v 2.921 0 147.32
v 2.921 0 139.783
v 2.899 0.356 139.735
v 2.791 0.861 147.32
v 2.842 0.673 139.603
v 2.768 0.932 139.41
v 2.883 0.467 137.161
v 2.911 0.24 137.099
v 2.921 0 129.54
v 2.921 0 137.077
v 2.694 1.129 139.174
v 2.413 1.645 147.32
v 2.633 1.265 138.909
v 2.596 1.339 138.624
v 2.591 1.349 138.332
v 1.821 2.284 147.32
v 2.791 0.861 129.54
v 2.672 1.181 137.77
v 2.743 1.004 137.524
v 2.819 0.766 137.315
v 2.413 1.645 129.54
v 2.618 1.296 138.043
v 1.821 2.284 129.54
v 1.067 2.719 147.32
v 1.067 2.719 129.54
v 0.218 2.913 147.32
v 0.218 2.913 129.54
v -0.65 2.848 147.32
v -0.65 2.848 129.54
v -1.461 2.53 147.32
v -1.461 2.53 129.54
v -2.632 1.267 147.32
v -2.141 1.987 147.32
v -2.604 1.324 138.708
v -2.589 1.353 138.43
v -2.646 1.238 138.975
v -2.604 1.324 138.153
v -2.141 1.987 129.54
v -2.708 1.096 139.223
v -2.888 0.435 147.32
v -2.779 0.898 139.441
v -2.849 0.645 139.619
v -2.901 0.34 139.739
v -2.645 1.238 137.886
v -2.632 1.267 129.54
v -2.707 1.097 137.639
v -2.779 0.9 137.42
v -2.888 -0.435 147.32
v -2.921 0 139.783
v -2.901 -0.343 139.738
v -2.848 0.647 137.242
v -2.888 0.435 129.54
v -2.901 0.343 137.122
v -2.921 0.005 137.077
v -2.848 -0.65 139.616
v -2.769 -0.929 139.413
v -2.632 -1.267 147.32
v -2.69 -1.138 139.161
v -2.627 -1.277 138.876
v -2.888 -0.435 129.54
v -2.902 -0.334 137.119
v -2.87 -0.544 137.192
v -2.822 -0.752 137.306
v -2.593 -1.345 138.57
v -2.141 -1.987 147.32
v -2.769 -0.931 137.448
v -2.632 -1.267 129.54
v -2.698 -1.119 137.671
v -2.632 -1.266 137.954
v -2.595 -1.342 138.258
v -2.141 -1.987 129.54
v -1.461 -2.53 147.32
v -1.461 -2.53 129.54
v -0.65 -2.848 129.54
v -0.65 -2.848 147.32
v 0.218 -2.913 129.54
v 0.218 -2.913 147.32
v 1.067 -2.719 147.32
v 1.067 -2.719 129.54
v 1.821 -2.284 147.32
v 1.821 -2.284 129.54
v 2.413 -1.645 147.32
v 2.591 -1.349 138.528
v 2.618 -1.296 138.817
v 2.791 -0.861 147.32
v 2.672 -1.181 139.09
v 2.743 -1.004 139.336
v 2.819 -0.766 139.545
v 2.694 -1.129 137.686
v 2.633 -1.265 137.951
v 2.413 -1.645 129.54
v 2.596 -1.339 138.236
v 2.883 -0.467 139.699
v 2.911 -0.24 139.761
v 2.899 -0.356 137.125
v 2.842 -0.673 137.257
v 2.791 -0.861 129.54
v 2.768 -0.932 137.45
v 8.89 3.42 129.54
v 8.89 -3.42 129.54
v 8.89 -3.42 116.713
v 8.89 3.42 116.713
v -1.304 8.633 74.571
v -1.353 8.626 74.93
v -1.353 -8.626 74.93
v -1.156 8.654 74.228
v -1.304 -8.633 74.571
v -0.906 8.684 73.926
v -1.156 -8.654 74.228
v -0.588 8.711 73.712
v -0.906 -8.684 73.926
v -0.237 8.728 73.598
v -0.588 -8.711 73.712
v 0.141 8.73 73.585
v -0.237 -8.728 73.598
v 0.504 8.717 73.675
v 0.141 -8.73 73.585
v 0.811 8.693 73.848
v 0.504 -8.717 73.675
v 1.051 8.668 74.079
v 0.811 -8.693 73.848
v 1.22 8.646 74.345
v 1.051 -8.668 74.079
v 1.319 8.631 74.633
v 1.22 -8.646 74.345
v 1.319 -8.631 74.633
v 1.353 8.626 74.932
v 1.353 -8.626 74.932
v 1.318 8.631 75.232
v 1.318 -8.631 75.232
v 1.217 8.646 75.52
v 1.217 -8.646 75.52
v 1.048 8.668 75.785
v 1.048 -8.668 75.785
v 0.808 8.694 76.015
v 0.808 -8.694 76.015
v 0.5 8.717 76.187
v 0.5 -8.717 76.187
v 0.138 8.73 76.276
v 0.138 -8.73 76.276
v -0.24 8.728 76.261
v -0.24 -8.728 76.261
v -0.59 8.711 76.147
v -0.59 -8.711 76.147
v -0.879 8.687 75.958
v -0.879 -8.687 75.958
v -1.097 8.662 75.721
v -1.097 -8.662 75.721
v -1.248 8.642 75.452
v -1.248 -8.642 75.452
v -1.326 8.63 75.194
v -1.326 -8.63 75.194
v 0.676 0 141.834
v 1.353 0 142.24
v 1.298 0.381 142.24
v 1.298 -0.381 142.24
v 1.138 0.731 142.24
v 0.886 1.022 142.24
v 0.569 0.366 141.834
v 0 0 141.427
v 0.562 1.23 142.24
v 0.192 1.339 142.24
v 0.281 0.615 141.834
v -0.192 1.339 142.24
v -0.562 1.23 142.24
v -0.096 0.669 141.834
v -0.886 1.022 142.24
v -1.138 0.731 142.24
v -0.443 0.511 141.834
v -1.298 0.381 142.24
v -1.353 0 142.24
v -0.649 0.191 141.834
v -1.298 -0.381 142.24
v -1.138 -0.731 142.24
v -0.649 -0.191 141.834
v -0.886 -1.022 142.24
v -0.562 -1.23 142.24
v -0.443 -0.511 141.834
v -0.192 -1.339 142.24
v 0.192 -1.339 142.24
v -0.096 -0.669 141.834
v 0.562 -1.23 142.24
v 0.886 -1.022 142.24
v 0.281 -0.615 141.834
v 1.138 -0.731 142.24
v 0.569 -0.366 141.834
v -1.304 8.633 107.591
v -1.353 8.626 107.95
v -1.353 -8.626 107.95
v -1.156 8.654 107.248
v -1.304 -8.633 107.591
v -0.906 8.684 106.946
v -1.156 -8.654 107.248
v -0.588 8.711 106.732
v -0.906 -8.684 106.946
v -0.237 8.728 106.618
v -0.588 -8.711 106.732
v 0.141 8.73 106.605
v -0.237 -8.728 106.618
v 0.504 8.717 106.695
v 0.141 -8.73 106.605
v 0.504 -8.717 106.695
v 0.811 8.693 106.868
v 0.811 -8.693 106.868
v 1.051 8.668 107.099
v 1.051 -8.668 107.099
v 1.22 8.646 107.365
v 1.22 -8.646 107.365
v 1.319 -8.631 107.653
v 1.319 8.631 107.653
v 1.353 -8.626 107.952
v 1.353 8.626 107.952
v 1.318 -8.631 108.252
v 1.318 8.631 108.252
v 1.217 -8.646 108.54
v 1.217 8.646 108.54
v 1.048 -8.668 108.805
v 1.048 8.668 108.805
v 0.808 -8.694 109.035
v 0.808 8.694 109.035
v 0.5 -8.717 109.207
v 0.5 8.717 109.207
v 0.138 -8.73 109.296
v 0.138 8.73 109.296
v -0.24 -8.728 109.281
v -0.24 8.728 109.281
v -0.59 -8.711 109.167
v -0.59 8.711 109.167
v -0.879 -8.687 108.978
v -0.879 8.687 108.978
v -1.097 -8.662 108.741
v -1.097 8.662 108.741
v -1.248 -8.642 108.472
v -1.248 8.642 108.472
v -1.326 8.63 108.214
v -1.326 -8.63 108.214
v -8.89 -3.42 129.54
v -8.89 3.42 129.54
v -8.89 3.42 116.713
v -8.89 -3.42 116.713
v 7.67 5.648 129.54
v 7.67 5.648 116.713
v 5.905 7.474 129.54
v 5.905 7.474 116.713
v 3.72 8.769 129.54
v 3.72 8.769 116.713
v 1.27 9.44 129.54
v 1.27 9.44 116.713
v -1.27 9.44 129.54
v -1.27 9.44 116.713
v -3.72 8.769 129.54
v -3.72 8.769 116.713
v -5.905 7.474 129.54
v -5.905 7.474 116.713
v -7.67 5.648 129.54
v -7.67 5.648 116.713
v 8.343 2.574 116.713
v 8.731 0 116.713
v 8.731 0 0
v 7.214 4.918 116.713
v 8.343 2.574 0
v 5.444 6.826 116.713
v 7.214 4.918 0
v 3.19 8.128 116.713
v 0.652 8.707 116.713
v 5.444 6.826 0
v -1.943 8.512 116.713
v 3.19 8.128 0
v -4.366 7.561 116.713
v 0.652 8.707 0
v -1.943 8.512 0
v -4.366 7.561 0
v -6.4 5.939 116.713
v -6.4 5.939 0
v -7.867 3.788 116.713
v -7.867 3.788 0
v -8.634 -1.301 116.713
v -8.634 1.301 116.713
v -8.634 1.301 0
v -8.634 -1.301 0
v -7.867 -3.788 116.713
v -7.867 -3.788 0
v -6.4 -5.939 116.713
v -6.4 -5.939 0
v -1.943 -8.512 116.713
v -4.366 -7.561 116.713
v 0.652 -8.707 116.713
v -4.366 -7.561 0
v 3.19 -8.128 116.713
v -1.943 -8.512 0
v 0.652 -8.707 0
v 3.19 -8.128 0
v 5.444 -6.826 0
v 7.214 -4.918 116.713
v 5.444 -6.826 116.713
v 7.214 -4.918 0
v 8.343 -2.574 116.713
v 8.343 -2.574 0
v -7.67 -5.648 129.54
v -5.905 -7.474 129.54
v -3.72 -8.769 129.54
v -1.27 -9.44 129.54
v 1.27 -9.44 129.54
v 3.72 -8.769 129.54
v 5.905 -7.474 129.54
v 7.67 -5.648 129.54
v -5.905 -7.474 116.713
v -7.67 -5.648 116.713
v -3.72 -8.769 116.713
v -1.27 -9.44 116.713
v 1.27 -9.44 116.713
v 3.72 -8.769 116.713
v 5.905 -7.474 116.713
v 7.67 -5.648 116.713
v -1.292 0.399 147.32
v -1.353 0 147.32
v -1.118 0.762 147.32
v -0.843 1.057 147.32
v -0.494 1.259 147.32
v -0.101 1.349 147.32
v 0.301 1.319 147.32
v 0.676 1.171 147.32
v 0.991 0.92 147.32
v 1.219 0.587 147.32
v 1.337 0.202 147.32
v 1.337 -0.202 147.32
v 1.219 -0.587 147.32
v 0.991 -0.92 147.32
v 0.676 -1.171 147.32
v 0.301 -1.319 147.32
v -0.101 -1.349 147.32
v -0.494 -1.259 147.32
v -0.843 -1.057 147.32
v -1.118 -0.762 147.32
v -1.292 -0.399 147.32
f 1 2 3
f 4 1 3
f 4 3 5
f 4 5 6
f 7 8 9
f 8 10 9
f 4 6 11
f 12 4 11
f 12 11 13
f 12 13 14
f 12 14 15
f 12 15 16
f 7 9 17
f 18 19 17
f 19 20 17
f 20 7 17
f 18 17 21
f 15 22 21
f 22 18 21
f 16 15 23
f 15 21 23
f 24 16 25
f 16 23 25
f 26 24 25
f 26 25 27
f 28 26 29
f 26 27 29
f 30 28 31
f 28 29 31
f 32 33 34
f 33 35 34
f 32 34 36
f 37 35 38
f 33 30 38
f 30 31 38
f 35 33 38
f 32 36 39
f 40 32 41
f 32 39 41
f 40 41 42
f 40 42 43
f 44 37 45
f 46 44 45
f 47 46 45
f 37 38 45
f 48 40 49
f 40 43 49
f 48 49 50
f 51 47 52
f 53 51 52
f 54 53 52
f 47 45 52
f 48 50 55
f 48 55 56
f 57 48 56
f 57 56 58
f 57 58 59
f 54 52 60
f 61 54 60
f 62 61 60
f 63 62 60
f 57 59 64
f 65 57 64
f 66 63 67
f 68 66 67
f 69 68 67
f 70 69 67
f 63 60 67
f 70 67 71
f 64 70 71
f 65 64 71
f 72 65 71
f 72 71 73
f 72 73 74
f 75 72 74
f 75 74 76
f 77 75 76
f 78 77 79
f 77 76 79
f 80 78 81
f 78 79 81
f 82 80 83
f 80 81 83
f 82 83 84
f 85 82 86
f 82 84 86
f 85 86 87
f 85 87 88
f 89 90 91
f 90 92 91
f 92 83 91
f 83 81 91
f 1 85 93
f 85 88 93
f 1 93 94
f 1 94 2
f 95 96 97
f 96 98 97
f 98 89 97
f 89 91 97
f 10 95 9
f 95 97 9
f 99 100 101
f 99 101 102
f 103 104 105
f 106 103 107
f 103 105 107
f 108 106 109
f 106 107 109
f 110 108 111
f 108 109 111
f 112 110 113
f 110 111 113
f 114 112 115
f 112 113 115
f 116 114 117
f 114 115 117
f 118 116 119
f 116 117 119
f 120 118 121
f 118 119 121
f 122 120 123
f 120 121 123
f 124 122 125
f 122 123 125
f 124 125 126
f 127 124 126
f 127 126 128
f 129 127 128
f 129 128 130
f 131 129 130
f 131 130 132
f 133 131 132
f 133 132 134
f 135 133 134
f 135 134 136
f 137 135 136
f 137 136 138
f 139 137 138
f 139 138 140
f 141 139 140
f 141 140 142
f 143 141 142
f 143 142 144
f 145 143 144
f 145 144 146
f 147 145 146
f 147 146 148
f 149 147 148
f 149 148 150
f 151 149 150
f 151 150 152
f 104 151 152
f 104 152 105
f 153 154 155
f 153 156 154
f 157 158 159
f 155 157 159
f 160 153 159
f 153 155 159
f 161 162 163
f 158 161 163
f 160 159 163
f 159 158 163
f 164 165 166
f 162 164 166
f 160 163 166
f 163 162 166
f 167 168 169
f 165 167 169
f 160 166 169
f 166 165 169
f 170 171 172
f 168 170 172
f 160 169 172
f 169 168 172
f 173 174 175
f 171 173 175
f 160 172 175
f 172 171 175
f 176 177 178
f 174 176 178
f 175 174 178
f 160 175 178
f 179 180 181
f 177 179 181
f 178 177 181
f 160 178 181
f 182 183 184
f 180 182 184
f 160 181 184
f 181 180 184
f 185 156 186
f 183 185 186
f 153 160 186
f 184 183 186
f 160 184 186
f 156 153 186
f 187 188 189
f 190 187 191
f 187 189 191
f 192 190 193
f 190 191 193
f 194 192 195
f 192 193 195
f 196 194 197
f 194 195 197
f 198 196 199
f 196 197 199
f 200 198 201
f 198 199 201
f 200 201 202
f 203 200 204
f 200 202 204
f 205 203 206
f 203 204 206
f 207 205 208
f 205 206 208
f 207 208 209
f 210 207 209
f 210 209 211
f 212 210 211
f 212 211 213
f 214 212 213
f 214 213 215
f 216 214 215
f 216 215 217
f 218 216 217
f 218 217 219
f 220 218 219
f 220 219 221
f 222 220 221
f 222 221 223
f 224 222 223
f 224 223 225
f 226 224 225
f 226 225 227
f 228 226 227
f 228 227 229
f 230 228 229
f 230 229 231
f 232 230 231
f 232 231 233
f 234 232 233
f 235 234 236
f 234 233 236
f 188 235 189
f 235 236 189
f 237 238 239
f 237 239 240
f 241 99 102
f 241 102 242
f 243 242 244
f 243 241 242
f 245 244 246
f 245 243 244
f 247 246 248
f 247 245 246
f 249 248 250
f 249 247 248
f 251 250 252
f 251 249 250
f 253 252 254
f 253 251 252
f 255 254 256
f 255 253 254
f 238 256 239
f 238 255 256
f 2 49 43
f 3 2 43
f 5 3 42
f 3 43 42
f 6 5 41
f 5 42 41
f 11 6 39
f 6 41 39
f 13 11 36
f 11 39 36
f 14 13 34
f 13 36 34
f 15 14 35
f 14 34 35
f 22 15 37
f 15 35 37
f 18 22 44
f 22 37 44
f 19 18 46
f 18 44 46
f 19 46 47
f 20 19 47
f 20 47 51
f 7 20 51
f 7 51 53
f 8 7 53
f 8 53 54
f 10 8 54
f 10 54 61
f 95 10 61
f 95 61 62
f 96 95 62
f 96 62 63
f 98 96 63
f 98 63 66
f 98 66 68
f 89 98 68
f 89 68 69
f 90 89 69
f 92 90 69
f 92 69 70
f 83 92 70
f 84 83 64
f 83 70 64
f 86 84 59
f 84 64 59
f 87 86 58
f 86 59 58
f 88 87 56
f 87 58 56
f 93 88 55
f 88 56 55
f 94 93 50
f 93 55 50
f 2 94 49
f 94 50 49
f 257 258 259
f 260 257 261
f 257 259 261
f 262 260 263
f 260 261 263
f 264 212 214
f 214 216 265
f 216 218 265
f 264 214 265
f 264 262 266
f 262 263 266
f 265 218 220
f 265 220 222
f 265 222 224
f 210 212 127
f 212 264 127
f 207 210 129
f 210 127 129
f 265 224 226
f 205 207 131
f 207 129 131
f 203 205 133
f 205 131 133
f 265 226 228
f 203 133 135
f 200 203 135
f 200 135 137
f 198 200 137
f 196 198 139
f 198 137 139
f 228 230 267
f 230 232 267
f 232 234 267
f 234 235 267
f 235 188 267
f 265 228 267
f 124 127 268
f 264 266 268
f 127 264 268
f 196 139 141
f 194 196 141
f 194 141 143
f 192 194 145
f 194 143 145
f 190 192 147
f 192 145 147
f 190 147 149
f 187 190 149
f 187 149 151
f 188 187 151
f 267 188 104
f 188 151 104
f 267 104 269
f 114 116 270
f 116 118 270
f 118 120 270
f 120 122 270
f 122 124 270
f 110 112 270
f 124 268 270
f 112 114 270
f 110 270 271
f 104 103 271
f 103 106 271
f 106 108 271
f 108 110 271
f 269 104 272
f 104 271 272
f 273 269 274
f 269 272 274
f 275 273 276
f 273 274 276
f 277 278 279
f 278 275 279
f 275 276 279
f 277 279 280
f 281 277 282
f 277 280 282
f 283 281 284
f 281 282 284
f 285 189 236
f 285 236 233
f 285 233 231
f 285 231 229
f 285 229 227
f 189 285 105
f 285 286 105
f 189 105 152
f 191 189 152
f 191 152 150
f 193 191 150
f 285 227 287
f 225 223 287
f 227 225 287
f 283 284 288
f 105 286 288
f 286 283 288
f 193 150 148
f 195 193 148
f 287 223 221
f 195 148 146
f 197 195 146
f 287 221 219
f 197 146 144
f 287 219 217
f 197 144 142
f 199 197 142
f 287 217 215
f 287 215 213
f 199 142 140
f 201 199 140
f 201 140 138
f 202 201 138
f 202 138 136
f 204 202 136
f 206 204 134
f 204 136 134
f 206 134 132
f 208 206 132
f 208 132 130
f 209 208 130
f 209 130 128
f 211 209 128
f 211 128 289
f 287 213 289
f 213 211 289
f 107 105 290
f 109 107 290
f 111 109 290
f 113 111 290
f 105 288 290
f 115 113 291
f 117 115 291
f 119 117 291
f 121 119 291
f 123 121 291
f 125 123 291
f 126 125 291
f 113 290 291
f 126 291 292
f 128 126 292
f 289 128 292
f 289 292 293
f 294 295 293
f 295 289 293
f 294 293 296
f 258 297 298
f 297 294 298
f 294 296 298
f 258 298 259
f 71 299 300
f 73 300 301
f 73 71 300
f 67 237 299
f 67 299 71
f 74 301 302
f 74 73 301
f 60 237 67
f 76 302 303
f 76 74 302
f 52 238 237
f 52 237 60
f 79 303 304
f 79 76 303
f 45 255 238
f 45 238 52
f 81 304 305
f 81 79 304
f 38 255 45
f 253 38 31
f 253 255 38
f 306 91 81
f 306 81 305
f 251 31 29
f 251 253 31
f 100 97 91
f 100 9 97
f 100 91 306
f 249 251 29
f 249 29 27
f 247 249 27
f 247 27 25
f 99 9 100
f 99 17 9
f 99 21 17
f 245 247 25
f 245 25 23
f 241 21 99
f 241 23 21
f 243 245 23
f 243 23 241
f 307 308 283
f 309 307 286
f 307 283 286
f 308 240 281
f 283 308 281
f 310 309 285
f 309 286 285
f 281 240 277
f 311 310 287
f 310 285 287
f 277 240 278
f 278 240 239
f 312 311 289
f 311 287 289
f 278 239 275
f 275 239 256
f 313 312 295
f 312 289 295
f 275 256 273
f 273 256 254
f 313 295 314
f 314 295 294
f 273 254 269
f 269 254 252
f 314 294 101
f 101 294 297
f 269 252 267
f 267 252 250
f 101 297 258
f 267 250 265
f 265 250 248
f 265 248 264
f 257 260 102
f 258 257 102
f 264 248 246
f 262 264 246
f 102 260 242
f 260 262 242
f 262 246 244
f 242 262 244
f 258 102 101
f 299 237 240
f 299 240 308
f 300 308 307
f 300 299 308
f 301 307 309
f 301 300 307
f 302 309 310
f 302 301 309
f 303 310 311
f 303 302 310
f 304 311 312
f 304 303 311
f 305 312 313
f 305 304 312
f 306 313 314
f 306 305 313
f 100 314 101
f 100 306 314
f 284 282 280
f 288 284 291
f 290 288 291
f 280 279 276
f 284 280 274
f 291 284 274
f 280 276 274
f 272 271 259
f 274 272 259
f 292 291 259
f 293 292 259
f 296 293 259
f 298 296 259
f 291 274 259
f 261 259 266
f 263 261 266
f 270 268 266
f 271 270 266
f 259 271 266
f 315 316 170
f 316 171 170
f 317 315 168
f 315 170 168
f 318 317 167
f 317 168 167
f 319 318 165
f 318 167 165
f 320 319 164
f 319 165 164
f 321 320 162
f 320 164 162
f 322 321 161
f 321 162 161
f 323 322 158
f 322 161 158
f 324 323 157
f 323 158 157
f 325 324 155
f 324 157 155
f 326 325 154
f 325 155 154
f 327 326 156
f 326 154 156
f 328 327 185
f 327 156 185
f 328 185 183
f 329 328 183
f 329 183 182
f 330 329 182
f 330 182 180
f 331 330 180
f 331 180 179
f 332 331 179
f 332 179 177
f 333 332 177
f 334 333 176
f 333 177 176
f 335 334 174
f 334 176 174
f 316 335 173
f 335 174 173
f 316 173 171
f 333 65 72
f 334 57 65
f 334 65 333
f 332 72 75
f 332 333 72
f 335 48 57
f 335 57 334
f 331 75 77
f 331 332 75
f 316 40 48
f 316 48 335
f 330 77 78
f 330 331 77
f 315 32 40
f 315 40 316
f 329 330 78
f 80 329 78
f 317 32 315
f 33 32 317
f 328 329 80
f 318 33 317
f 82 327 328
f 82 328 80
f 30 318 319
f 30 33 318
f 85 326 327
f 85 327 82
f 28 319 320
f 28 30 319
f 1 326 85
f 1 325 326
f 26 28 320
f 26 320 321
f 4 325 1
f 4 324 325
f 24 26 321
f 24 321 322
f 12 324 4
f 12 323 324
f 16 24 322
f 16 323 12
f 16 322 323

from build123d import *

# Parameters (mm, degrees)
SKETCH1_R                 = 8.73125
BOSS_EXTRUDE1_DEPTH       = 129.54
SKETCH2_R                 = 2.921
BOSS_EXTRUDE2_DEPTH       = 17.78
F_6_32_TAPPED_HOLE1_D     = 2.7051
F_6_32_TAPPED_HOLE2_D     = 2.7051
BOSS_EXTRUDE3_DEPTH       = 12.827
F_6_32_TAPPED_HOLE3_D     = 2.7051
F_6_32_TAPPED_HOLE3_DEPTH = 5.08
F_6_32_TAPPED_HOLE3_TIP   = 0.81269403


with BuildPart() as part:
    # Sketch1 → Boss-Extrude1 (new body)
    with BuildSketch(Plane.XY):
        Circle(SKETCH1_R)
    extrude(amount=BOSS_EXTRUDE1_DEPTH)

    # Sketch2 → Boss-Extrude2 (add)
    with BuildSketch(Plane.XY.offset(129.54)):
        Circle(SKETCH2_R)
    extrude(amount=BOSS_EXTRUDE2_DEPTH)

    # #6-32 Tapped Hole1 (through all)
    with Locations(Plane(origin=(0, 8.73125, 0), x_dir=(1, 0, 0), z_dir=(0, 1, 0))):
        with Locations((0, -74.93), (0, -107.95)):
            Hole(F_6_32_TAPPED_HOLE1_D / 2)

    # #6-32 Tapped Hole2 (through all)
    with Locations(Plane(origin=(2.921, 0, 0), x_dir=(0, 0, -1), z_dir=(1, 0, 0))):
        with Locations((-138.43, 0)):
            Hole(F_6_32_TAPPED_HOLE2_D / 2)

    # Sketch10 → Boss-Extrude3 (add)
    with BuildSketch(Plane.XY.offset(129.54)):
        with BuildLine():
            Line((8.89, -3.419579653), (8.89, 3.419579653))
            ThreePointArc((8.89, 3.419579653), (0, 9.525), (-8.89, 3.419579653))
            Line((-8.89, 3.419579653), (-8.89, -3.419579653))
            ThreePointArc((-8.89, -3.419579653), (0, -9.525), (8.89, -3.419579653))
        make_face()
    extrude(amount=-BOSS_EXTRUDE3_DEPTH)

    # #6-32 Tapped Hole3
    with Locations(Plane.XY.offset(147.32)):
        with Locations((0, 0)):
            Hole(F_6_32_TAPPED_HOLE3_D / 2, depth=F_6_32_TAPPED_HOLE3_DEPTH)
            with Locations((0, 0, -(F_6_32_TAPPED_HOLE3_DEPTH + F_6_32_TAPPED_HOLE3_TIP / 2))):  # 118° drill point
                Cone(0, F_6_32_TAPPED_HOLE3_D / 2, F_6_32_TAPPED_HOLE3_TIP, mode=Mode.SUBTRACT)


solid = part.part
